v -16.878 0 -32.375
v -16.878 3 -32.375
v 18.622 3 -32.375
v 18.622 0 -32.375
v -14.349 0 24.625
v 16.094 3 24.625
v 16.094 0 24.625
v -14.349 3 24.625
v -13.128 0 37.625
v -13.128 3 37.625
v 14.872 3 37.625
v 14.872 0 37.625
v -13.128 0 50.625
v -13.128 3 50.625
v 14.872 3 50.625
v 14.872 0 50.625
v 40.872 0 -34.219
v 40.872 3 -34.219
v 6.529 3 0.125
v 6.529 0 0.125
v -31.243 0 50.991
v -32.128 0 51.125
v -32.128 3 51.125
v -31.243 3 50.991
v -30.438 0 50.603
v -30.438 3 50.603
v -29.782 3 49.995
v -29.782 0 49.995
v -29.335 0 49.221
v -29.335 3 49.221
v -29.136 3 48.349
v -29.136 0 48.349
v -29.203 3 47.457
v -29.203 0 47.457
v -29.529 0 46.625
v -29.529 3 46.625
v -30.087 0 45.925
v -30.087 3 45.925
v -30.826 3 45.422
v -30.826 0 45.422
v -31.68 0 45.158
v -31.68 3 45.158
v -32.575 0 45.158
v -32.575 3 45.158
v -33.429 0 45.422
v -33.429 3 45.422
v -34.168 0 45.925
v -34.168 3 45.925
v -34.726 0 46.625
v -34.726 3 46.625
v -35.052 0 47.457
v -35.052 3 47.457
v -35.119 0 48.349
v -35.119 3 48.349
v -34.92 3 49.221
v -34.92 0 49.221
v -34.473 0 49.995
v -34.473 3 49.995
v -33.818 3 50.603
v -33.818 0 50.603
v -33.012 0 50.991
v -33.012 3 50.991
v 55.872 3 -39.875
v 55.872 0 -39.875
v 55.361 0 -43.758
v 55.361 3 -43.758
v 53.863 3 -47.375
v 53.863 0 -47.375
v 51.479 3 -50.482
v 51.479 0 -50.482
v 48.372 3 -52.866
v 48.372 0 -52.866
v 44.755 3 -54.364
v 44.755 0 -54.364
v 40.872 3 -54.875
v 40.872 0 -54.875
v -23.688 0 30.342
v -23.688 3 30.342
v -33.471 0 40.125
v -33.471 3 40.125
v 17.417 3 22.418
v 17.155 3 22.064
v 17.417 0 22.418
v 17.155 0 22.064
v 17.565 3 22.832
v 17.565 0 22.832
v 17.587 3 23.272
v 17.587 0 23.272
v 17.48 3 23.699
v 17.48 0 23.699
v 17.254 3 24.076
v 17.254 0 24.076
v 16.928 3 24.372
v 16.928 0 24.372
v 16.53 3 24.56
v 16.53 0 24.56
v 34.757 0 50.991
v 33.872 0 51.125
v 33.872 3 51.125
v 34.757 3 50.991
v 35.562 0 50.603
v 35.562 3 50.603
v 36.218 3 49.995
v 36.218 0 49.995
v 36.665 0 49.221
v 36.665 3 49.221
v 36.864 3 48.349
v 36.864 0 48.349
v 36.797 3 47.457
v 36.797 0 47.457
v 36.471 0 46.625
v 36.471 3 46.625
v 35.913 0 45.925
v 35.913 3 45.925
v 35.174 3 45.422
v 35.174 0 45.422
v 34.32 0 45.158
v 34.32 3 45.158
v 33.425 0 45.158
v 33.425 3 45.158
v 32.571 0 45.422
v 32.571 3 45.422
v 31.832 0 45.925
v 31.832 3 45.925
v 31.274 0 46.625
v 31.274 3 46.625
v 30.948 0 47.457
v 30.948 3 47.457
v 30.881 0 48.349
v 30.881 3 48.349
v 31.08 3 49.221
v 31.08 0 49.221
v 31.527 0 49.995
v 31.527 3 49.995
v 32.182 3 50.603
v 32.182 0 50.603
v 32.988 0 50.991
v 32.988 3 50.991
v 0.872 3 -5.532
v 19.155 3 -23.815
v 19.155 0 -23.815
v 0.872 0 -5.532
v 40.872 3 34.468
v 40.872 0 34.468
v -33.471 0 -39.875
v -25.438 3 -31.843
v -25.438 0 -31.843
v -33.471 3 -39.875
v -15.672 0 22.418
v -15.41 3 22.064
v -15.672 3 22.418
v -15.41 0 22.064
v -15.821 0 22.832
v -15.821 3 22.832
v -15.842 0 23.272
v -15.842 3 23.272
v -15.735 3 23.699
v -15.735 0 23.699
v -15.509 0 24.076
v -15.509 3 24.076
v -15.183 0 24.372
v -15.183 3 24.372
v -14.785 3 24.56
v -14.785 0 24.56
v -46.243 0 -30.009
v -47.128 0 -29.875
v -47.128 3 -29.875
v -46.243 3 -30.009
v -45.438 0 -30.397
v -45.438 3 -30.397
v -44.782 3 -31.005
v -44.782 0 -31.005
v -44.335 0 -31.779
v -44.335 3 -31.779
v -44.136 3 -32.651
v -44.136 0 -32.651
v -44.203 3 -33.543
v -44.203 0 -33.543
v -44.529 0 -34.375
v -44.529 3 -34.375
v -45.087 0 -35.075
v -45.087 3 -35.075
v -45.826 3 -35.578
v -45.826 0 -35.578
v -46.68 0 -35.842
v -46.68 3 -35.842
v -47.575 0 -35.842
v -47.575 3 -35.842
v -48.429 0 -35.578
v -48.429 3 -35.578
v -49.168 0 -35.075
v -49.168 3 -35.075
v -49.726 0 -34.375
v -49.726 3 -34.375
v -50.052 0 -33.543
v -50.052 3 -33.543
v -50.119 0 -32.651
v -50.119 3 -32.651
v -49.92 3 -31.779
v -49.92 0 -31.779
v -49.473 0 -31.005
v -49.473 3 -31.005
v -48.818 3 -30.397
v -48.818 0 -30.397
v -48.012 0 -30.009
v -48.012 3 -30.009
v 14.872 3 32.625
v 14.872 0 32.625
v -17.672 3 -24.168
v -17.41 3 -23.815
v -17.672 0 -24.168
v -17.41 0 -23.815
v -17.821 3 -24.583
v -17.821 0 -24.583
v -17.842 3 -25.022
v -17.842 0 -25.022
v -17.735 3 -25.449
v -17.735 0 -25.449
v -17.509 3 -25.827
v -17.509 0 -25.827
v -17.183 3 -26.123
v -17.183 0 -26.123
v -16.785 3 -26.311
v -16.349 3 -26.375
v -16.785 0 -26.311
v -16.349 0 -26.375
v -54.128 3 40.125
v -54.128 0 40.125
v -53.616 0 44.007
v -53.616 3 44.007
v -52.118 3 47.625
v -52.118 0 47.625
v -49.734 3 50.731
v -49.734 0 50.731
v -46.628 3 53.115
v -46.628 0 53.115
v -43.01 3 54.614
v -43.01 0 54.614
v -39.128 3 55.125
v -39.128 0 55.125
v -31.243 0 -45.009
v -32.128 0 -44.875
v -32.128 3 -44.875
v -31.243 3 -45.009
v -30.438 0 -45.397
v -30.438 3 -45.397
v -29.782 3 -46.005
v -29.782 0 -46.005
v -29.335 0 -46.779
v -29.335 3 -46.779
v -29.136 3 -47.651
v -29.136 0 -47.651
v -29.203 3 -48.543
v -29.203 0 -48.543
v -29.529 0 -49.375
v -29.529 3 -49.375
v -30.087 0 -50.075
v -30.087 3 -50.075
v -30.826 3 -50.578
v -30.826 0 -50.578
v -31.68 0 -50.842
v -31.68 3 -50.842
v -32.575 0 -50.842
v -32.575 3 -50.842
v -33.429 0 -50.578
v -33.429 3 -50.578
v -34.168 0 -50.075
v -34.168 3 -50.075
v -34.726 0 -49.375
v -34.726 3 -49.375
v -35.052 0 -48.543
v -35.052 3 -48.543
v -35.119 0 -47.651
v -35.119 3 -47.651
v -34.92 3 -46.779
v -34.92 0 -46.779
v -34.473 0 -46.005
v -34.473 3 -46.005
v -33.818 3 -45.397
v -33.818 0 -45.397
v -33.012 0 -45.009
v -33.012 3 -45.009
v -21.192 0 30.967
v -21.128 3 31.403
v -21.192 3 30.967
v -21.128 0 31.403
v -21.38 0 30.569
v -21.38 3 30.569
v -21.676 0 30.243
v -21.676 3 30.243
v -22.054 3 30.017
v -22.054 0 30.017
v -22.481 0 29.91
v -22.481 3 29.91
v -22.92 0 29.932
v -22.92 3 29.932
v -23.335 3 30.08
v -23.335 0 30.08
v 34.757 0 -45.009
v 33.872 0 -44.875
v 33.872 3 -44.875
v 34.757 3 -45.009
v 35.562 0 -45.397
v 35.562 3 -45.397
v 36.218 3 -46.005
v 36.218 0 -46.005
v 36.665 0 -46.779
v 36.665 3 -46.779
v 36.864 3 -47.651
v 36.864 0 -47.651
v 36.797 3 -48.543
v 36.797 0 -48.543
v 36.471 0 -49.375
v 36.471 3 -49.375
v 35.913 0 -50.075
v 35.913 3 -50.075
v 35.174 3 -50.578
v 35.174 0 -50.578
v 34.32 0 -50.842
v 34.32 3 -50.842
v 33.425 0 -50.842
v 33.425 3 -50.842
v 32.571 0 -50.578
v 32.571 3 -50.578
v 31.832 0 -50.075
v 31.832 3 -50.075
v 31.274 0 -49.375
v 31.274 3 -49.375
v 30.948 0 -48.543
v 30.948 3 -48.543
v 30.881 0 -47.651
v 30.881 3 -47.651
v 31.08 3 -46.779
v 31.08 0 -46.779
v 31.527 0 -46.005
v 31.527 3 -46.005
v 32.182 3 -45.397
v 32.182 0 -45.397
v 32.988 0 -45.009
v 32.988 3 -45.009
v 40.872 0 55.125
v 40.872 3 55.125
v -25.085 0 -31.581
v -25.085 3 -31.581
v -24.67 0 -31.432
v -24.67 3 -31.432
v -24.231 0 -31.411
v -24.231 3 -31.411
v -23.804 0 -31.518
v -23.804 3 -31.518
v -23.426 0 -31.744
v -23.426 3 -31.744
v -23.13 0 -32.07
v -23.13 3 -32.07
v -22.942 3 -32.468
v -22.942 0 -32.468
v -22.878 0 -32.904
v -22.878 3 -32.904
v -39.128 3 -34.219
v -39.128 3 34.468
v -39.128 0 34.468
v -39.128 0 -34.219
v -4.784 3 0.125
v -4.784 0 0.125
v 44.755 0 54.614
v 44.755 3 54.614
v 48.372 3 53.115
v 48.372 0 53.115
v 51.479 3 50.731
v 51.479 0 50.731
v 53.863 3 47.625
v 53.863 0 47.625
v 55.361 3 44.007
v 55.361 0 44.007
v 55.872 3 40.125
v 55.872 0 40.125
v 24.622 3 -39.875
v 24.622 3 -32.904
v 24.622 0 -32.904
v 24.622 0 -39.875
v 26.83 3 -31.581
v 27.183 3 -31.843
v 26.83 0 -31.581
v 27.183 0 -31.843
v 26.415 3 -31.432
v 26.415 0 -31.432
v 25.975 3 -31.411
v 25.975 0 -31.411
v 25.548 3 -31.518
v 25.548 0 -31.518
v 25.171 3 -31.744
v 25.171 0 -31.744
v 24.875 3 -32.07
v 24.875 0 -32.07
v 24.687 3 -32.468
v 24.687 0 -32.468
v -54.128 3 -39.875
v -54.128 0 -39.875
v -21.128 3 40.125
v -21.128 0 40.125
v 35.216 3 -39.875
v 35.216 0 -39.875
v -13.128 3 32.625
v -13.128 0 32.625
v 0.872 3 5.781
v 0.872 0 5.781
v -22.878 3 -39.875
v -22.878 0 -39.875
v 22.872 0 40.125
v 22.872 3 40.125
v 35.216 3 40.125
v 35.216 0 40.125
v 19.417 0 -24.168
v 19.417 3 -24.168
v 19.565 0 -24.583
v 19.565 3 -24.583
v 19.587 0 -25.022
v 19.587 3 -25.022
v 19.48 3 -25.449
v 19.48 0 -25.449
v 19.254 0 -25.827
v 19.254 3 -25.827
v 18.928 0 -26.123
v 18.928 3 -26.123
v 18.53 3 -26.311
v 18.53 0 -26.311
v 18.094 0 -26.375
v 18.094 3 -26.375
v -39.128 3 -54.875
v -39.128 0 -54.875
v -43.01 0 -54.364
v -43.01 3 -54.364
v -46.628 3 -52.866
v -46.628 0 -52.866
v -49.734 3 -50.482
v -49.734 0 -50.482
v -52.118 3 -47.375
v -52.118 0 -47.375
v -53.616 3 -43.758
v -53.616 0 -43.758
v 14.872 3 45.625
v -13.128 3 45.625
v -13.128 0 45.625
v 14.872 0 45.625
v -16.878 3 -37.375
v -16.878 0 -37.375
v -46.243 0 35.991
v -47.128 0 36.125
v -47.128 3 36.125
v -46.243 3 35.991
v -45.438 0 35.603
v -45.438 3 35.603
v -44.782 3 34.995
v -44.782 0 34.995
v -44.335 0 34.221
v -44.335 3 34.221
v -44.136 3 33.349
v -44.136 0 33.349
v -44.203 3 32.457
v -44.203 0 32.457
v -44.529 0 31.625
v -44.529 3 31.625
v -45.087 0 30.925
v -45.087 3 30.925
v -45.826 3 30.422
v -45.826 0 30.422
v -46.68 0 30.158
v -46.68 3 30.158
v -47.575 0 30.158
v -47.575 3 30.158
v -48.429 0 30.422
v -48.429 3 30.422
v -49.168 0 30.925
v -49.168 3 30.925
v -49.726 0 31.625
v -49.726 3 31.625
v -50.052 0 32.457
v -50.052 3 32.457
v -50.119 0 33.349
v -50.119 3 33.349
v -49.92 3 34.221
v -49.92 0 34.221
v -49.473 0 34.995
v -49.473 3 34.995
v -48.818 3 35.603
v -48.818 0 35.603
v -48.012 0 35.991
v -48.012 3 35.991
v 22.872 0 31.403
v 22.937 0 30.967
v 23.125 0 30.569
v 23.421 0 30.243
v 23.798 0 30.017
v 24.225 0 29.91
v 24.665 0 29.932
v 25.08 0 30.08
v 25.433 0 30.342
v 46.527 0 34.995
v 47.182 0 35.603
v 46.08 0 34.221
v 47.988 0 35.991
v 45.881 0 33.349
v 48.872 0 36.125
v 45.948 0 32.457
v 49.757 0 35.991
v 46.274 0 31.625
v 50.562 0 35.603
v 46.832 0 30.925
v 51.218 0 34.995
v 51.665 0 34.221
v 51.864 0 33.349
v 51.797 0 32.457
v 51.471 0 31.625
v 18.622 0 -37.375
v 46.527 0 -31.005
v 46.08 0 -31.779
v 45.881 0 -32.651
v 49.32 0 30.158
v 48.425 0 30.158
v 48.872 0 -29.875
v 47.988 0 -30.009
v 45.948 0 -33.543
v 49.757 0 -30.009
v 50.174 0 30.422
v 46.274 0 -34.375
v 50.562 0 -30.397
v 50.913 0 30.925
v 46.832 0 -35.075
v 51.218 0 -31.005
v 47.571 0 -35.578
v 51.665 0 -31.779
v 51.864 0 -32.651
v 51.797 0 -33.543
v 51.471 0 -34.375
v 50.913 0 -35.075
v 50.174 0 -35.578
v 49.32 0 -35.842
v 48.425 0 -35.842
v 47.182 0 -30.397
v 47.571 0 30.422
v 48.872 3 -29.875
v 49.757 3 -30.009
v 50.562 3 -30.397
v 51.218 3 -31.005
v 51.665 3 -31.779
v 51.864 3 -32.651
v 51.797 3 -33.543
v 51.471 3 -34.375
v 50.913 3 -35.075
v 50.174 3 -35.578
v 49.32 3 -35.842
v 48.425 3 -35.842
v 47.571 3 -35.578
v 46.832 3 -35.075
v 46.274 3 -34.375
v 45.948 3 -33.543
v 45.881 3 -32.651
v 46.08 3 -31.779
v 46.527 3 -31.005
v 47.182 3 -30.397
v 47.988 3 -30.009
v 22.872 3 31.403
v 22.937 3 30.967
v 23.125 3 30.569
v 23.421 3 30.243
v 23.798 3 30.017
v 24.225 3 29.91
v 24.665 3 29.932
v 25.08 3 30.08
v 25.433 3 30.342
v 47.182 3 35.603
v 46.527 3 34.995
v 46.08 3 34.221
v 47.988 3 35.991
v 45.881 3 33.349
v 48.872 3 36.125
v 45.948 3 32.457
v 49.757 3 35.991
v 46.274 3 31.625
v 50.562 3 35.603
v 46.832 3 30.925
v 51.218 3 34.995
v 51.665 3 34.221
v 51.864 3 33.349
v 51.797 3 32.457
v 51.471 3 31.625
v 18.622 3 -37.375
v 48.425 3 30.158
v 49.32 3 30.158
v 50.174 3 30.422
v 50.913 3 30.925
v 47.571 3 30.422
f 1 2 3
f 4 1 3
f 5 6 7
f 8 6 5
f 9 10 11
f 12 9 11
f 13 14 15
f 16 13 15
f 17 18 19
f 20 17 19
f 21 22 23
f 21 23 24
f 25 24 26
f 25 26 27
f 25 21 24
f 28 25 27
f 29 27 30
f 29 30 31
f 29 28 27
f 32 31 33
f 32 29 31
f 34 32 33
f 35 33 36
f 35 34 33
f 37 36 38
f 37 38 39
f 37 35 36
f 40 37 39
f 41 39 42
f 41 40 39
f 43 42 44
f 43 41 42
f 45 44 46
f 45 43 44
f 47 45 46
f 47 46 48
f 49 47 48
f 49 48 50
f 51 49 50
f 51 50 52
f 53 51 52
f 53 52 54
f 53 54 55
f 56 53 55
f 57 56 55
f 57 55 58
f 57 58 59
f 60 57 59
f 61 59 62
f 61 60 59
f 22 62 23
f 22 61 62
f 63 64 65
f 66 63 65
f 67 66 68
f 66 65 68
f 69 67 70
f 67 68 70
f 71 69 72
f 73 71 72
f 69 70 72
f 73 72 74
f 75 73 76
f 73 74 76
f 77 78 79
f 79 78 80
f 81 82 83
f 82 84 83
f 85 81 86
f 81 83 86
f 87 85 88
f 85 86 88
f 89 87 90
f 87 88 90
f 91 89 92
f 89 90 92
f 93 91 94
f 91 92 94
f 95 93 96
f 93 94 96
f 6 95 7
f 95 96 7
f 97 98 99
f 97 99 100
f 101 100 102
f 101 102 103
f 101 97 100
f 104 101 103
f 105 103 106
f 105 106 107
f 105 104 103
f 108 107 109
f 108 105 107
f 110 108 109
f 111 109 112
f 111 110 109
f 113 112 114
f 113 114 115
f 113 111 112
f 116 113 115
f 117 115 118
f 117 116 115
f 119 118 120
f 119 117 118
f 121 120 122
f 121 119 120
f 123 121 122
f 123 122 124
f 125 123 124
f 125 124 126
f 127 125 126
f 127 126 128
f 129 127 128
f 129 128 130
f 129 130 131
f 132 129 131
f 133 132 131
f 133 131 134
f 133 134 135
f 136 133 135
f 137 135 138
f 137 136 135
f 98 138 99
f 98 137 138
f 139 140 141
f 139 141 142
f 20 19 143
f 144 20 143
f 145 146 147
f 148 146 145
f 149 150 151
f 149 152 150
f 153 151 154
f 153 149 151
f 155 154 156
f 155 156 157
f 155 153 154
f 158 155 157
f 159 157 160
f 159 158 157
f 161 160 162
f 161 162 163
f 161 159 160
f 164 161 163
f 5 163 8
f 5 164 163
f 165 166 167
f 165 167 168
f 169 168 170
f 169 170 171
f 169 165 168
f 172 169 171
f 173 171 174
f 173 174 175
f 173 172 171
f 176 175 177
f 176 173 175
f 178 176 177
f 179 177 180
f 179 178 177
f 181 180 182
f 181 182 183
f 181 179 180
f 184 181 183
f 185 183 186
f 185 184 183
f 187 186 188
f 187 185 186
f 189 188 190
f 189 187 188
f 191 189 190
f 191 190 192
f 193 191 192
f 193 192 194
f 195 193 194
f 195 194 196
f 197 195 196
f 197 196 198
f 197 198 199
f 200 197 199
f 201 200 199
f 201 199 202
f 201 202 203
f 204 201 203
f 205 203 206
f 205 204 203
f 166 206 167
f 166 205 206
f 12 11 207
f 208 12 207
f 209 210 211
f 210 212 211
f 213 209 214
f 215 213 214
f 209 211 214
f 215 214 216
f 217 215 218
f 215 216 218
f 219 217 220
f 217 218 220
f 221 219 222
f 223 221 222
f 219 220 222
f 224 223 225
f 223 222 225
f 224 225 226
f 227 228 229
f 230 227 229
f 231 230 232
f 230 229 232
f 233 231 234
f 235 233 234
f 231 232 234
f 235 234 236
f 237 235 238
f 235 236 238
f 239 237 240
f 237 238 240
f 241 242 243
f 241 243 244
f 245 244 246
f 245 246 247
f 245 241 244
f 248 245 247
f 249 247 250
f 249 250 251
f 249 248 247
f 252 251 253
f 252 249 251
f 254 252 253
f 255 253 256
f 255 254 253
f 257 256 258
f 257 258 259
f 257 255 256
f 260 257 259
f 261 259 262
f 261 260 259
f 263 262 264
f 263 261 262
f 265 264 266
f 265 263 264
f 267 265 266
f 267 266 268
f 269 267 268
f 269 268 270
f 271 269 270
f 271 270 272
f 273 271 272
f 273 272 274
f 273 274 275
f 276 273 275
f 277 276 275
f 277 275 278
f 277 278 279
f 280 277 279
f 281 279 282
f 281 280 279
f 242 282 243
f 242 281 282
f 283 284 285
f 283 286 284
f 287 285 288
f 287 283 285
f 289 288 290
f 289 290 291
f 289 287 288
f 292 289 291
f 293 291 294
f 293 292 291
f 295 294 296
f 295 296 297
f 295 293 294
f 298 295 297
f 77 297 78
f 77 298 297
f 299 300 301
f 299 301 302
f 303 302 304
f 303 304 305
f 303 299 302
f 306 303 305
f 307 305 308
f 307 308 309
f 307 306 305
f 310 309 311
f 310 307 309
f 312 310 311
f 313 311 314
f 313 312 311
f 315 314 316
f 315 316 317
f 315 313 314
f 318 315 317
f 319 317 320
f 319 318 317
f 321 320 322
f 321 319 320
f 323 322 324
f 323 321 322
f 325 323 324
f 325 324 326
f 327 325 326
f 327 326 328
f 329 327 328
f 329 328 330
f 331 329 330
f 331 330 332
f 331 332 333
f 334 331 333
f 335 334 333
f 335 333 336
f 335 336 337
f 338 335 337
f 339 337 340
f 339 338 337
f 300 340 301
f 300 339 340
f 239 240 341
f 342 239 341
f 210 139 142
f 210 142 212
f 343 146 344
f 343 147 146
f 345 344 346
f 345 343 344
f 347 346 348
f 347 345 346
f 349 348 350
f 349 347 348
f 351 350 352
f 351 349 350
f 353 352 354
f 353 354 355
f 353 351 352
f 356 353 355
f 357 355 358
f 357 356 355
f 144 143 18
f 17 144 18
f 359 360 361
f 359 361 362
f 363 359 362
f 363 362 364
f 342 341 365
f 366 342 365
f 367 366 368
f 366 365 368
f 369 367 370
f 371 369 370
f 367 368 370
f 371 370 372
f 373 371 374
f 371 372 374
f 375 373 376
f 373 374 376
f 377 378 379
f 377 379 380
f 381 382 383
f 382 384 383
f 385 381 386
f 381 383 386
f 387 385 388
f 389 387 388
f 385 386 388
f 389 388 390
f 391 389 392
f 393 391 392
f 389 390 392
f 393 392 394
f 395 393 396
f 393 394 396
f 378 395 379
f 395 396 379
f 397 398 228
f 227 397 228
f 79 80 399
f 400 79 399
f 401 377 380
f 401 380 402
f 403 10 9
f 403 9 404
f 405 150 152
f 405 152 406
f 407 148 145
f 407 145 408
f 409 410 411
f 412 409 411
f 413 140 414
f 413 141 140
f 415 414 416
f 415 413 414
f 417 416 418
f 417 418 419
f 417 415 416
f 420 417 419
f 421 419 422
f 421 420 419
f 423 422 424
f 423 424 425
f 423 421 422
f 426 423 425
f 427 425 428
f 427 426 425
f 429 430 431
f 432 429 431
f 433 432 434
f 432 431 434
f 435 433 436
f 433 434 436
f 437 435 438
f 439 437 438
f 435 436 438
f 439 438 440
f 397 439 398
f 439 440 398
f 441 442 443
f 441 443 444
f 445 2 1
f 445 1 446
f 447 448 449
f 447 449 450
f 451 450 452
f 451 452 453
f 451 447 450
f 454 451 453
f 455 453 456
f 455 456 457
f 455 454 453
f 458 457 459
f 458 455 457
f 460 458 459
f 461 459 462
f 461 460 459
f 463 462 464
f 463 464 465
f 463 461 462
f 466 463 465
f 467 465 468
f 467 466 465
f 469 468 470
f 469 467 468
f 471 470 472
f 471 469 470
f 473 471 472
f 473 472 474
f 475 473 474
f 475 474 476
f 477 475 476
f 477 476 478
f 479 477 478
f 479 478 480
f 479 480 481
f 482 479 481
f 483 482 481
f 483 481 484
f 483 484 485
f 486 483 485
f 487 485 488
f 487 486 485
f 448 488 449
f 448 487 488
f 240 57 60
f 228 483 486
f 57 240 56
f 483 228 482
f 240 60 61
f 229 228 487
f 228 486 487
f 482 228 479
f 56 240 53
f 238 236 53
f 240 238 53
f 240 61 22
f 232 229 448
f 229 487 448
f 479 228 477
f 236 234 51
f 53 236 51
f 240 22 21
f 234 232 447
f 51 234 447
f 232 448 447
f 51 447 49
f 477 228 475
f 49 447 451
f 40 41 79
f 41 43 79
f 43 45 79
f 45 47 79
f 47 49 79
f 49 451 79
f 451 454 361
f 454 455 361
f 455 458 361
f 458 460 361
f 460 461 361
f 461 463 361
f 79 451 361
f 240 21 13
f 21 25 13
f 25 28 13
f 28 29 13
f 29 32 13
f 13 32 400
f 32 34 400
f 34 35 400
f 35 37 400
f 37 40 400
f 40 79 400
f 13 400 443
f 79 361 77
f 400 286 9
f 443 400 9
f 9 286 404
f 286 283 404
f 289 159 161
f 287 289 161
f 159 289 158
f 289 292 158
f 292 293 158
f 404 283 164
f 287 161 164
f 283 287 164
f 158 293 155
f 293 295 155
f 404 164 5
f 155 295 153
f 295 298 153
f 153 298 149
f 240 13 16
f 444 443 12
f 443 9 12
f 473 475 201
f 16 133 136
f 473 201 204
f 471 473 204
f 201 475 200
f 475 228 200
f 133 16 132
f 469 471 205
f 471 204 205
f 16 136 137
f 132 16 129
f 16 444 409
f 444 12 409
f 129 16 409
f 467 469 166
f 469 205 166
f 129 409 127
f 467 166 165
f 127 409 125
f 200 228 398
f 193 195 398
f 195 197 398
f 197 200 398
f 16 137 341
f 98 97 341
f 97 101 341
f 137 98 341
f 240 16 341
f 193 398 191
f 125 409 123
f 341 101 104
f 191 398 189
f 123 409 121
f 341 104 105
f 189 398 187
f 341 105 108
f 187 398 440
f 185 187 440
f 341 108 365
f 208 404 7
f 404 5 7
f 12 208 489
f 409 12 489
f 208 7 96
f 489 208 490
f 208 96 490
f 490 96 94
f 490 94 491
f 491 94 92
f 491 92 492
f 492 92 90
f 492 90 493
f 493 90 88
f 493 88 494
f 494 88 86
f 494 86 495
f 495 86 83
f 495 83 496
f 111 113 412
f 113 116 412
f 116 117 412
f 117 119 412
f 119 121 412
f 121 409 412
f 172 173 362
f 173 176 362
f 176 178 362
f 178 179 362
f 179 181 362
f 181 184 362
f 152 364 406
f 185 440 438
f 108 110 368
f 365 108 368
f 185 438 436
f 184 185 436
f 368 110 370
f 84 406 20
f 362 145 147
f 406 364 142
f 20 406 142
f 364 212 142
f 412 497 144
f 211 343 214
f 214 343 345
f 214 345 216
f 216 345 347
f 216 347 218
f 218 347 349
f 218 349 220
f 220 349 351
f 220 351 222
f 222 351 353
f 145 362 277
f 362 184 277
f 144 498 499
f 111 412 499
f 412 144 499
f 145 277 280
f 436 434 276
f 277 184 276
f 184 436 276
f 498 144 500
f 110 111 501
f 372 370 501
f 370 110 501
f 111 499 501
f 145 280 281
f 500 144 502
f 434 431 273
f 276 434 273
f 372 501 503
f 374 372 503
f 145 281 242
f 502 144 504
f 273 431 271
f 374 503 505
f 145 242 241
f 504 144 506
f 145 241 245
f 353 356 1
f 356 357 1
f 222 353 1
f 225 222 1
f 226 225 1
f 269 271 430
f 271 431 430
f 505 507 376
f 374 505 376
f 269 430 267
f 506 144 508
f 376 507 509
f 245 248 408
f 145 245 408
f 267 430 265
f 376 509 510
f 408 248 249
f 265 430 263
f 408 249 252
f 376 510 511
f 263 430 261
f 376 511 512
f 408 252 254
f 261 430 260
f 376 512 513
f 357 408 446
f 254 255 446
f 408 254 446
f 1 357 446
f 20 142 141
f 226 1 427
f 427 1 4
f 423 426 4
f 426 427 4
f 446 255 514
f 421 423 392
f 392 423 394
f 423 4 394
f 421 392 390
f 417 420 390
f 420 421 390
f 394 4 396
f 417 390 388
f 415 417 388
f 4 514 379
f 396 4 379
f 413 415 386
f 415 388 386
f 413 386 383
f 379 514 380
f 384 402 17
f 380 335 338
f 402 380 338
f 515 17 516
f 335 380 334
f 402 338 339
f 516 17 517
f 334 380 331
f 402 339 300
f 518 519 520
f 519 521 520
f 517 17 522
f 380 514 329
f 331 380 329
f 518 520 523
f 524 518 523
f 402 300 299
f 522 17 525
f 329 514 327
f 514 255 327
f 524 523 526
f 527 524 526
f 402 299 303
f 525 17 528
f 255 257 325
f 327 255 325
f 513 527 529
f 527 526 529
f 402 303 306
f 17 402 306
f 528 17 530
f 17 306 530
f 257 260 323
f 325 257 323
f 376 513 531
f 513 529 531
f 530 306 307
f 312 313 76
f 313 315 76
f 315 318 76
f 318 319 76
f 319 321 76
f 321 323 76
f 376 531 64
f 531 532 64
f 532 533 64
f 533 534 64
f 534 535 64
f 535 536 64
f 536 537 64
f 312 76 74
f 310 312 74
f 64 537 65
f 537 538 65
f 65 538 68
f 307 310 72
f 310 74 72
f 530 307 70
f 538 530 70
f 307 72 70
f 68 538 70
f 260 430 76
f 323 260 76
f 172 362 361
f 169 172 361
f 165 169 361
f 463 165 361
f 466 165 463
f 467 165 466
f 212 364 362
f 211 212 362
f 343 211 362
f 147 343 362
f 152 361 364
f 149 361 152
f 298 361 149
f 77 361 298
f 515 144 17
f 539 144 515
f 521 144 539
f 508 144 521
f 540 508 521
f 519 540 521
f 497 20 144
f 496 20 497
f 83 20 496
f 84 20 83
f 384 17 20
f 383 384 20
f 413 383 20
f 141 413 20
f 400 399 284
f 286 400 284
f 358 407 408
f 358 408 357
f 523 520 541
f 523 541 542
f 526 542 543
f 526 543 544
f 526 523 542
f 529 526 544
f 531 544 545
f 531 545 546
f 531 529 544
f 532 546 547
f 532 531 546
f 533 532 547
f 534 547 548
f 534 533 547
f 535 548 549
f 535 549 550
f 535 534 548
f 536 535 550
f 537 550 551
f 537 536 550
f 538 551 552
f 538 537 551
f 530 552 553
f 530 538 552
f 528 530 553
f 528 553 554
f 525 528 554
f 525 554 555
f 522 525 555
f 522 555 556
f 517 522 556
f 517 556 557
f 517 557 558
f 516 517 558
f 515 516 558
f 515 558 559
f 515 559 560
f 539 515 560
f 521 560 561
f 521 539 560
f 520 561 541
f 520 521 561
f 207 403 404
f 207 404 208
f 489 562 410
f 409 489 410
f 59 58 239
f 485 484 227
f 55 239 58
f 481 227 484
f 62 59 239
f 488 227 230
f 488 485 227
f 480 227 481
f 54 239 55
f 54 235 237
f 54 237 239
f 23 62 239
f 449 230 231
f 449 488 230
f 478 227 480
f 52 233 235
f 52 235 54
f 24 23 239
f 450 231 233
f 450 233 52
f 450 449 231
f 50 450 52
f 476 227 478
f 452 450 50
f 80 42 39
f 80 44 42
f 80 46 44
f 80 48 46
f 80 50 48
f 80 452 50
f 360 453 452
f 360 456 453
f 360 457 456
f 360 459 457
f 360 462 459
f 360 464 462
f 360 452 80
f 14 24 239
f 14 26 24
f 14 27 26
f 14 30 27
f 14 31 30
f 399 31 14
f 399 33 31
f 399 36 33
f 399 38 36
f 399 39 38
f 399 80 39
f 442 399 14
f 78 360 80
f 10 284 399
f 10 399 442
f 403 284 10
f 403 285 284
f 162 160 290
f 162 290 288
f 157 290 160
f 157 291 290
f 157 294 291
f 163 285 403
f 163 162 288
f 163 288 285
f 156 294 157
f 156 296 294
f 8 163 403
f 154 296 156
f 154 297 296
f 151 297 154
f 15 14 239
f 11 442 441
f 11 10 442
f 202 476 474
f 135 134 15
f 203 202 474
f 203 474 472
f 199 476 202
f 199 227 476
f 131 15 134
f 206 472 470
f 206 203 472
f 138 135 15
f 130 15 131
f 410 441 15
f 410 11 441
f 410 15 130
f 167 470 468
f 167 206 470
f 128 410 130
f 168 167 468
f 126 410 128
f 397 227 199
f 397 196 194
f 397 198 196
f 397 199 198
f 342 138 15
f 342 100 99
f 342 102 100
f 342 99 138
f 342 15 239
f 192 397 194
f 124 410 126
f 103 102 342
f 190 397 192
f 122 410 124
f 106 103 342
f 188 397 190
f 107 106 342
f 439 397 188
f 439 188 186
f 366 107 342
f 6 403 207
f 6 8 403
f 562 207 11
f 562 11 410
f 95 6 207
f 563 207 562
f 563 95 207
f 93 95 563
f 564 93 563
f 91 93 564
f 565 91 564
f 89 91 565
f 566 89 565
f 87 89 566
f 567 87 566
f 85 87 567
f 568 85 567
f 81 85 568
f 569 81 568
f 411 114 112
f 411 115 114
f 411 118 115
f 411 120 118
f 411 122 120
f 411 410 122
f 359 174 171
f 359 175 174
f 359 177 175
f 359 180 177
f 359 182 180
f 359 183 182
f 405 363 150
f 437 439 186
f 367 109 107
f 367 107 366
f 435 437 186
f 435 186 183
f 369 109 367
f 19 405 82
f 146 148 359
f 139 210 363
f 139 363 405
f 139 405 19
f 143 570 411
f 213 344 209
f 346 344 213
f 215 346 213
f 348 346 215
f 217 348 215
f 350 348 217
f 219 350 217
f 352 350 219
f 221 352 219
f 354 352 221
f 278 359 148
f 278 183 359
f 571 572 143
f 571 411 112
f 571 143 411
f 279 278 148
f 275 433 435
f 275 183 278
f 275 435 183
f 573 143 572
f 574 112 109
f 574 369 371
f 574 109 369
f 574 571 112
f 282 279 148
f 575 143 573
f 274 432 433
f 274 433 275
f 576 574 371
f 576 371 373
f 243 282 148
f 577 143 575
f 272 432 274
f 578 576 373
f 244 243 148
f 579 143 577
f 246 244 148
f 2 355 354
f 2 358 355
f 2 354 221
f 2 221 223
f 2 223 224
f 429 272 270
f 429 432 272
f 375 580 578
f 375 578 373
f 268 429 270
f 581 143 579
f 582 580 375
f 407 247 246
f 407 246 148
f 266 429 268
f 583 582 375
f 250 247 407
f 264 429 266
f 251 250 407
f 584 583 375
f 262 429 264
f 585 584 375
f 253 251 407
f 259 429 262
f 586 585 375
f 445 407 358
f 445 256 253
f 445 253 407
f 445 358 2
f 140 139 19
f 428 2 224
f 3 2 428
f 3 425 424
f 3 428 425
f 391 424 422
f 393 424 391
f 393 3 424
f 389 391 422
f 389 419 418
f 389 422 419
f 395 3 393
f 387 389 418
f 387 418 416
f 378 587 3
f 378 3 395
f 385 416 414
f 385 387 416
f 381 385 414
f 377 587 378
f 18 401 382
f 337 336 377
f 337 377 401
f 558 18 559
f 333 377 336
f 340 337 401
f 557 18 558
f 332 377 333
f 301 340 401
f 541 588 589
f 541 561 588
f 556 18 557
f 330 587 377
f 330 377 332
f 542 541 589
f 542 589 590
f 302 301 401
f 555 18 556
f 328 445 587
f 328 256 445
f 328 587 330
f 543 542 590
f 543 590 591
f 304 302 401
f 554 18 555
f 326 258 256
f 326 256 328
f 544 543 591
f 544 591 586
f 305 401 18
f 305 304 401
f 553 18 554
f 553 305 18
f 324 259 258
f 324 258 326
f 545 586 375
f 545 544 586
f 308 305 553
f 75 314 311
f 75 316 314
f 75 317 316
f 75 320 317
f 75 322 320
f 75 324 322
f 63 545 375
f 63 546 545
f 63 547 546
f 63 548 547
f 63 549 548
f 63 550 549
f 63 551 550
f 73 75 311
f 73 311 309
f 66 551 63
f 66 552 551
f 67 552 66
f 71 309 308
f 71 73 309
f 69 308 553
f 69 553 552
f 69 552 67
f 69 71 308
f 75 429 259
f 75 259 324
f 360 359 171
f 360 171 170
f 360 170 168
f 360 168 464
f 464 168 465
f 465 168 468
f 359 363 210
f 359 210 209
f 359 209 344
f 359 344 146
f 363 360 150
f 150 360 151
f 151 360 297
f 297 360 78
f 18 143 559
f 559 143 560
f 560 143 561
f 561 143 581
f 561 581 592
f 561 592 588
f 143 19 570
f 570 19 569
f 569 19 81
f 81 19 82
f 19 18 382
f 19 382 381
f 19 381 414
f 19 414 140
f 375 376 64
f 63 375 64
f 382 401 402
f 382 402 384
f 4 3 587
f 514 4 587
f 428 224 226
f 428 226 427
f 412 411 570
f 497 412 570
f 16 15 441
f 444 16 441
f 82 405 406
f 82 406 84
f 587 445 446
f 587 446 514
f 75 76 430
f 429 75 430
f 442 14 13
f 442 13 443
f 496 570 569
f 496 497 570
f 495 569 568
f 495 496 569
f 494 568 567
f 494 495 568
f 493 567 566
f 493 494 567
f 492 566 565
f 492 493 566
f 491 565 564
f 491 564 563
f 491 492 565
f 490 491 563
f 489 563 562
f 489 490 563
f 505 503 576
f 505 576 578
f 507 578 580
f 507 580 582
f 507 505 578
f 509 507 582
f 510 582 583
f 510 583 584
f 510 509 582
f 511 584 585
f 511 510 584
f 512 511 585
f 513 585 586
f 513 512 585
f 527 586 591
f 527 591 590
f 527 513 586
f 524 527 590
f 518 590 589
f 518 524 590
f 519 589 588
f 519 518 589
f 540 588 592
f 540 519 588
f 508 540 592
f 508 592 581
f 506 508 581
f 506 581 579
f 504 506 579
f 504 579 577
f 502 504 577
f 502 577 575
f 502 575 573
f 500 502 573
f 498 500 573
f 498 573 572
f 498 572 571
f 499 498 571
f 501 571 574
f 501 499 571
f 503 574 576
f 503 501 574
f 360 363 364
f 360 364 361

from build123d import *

# Parameters (mm, degrees)
SKETCH1_R           = 3
BOSS_EXTRUDE1_DEPTH = 3
SKETCH2_W           = 28
SKETCH2_H           = 5
SKETCH2_W_2         = 35.5
CUT_EXTRUDE1_DEPTH  = 79.545892535
CUT_EXTRUDE2_DEPTH  = 79.545892535
FILLET1_R           = 1.5
SKETCH4_W           = 28
SKETCH4_H           = 5
CUT_EXTRUDE3_DEPTH  = 79.545892535


with BuildPart() as part:
    # Sketch1 → Boss-Extrude1 (new body)
    with BuildSketch(Plane(origin=(0, 0, 0), x_dir=(1, 0, 0), z_dir=(0, 1, 0))):
        with BuildLine():
            Line((55.872458647, -40.12463695), (55.872458647, 39.87536305))
            ThreePointArc((55.872458647, 39.87536305), (51.479060365, 50.481964768), (40.872458647, 54.87536305))
            Line((40.872458647, 54.87536305), (-39.127541353, 54.87536305))
            ThreePointArc((-39.127541353, 54.87536305), (-49.734143071, 50.481964768), (-54.127541353, 39.87536305))
            Line((-54.127541353, 39.87536305), (-54.127541353, -40.12463695))
            ThreePointArc((-54.127541353, -40.12463695), (-49.734143071, -50.731238667), (-39.127541353, -55.12463695))
            Line((-39.127541353, -55.12463695), (40.872458647, -55.12463695))
            ThreePointArc((40.872458647, -55.12463695), (51.479060365, -50.731238667), (55.872458647, -40.12463695))
        make_face()
        with Locations(Location((48.872458647, 32.87536305, 0), (0, 0, 270))):
            Circle(SKETCH1_R, mode=Mode.SUBTRACT)
        with Locations(Location((-47.127541353, -33.12463695, 0), (0, 0, 270))):
            Circle(SKETCH1_R, mode=Mode.SUBTRACT)
        with Locations(Location((-32.127541353, -48.12463695, 0), (0, 0, 270))):
            Circle(SKETCH1_R, mode=Mode.SUBTRACT)
        with Locations(Location((33.872458647, -48.12463695, 0), (0, 0, 270))):
            Circle(SKETCH1_R, mode=Mode.SUBTRACT)
        with Locations(Location((48.872458647, -33.12463695, 0), (0, 0, 270))):
            Circle(SKETCH1_R, mode=Mode.SUBTRACT)
        with Locations(Location((33.872458647, 47.87536305, 0), (0, 0, 270))):
            Circle(SKETCH1_R, mode=Mode.SUBTRACT)
        with Locations(Location((-32.127541353, 47.87536305, 0), (0, 0, 270))):
            Circle(SKETCH1_R, mode=Mode.SUBTRACT)
        with Locations(Location((-47.127541353, 32.87536305, 0), (0, 0, 270))):
            Circle(SKETCH1_R, mode=Mode.SUBTRACT)
    extrude(amount=BOSS_EXTRUDE1_DEPTH)

    # Sketch2 → Cut-Extrude1 (cut, through all)
    with BuildSketch(Plane(origin=(0, 3, 0), x_dir=(1, 0, 0), z_dir=(0, 1, 0))):
        with Locations((0.872458647, -35.12463695)):
            Rectangle(SKETCH2_W, SKETCH2_H)
        with Locations((0.872458647, 34.87536305)):
            Rectangle(SKETCH2_W_2, SKETCH2_H)
    extrude(amount=-CUT_EXTRUDE1_DEPTH, mode=Mode.SUBTRACT)

    # Sketch3 → Cut-Extrude2 (cut, through all)
    with BuildSketch(Plane(origin=(0, 3, 0), x_dir=(1, 0, 0), z_dir=(0, 1, 0))):
        Polygon((-39.127541353, 34.218508801), (-4.784395603, -0.12463695), (-39.127541353, -34.4677827), align=None)
        Polygon((-33.470687104, -40.12463695), (-21.127541353, -40.12463695), (-21.127541353, -27.781491199), align=None)
        Polygon((-33.470687104, 39.87536305), (-22.877541353, 39.87536305), (-22.877541353, 29.2822173), align=None)
        Polygon((40.872458647, -34.4677827), (40.872458647, 34.218508801), (6.529312896, -0.12463695), align=None)
        Polygon((24.622458647, 29.2822173), (24.622458647, 39.87536305), (35.215604397, 39.87536305), align=None)
        Polygon((-19.970687104, 26.37536305), (21.715604397, 26.37536305), (0.872458647, 5.5322173), align=None)
        Polygon((22.872458647, -40.12463695), (35.215604397, -40.12463695), (22.872458647, -27.781491199), align=None)
        Polygon((19.715604397, -24.62463695), (-17.970687104, -24.62463695), (0.872458647, -5.781491199), align=None)
    extrude(amount=-CUT_EXTRUDE2_DEPTH, mode=Mode.SUBTRACT)

    # Fillet1
    fillet1_edges = [part.edges().sort_by_distance(p)[0] for p in [
        (22.872458647, 1.5, 27.781491199),
        (-21.127541353, 1.5, 27.781491199),
        (24.622458647, 1.5, -29.2822173),
        (-19.970687104, 1.5, -26.37536305),
        (21.715604397, 1.5, -26.37536305),
        (19.715604397, 1.5, 24.62463695),
        (-17.970687104, 1.5, 24.62463695),
        (-22.877541353, 1.5, -29.2822173),
    ]]
    fillet(fillet1_edges, radius=FILLET1_R)

    # Sketch4 → Cut-Extrude3 (cut, through all)
    with BuildSketch(Plane(origin=(0, 3, 0), x_dir=(1, 0, 0), z_dir=(0, 1, 0))):
        with Locations((0.872458647, -48.12463695)):
            Rectangle(SKETCH4_W, SKETCH4_H)
    extrude(amount=-CUT_EXTRUDE3_DEPTH, mode=Mode.SUBTRACT)


solid = part.part
